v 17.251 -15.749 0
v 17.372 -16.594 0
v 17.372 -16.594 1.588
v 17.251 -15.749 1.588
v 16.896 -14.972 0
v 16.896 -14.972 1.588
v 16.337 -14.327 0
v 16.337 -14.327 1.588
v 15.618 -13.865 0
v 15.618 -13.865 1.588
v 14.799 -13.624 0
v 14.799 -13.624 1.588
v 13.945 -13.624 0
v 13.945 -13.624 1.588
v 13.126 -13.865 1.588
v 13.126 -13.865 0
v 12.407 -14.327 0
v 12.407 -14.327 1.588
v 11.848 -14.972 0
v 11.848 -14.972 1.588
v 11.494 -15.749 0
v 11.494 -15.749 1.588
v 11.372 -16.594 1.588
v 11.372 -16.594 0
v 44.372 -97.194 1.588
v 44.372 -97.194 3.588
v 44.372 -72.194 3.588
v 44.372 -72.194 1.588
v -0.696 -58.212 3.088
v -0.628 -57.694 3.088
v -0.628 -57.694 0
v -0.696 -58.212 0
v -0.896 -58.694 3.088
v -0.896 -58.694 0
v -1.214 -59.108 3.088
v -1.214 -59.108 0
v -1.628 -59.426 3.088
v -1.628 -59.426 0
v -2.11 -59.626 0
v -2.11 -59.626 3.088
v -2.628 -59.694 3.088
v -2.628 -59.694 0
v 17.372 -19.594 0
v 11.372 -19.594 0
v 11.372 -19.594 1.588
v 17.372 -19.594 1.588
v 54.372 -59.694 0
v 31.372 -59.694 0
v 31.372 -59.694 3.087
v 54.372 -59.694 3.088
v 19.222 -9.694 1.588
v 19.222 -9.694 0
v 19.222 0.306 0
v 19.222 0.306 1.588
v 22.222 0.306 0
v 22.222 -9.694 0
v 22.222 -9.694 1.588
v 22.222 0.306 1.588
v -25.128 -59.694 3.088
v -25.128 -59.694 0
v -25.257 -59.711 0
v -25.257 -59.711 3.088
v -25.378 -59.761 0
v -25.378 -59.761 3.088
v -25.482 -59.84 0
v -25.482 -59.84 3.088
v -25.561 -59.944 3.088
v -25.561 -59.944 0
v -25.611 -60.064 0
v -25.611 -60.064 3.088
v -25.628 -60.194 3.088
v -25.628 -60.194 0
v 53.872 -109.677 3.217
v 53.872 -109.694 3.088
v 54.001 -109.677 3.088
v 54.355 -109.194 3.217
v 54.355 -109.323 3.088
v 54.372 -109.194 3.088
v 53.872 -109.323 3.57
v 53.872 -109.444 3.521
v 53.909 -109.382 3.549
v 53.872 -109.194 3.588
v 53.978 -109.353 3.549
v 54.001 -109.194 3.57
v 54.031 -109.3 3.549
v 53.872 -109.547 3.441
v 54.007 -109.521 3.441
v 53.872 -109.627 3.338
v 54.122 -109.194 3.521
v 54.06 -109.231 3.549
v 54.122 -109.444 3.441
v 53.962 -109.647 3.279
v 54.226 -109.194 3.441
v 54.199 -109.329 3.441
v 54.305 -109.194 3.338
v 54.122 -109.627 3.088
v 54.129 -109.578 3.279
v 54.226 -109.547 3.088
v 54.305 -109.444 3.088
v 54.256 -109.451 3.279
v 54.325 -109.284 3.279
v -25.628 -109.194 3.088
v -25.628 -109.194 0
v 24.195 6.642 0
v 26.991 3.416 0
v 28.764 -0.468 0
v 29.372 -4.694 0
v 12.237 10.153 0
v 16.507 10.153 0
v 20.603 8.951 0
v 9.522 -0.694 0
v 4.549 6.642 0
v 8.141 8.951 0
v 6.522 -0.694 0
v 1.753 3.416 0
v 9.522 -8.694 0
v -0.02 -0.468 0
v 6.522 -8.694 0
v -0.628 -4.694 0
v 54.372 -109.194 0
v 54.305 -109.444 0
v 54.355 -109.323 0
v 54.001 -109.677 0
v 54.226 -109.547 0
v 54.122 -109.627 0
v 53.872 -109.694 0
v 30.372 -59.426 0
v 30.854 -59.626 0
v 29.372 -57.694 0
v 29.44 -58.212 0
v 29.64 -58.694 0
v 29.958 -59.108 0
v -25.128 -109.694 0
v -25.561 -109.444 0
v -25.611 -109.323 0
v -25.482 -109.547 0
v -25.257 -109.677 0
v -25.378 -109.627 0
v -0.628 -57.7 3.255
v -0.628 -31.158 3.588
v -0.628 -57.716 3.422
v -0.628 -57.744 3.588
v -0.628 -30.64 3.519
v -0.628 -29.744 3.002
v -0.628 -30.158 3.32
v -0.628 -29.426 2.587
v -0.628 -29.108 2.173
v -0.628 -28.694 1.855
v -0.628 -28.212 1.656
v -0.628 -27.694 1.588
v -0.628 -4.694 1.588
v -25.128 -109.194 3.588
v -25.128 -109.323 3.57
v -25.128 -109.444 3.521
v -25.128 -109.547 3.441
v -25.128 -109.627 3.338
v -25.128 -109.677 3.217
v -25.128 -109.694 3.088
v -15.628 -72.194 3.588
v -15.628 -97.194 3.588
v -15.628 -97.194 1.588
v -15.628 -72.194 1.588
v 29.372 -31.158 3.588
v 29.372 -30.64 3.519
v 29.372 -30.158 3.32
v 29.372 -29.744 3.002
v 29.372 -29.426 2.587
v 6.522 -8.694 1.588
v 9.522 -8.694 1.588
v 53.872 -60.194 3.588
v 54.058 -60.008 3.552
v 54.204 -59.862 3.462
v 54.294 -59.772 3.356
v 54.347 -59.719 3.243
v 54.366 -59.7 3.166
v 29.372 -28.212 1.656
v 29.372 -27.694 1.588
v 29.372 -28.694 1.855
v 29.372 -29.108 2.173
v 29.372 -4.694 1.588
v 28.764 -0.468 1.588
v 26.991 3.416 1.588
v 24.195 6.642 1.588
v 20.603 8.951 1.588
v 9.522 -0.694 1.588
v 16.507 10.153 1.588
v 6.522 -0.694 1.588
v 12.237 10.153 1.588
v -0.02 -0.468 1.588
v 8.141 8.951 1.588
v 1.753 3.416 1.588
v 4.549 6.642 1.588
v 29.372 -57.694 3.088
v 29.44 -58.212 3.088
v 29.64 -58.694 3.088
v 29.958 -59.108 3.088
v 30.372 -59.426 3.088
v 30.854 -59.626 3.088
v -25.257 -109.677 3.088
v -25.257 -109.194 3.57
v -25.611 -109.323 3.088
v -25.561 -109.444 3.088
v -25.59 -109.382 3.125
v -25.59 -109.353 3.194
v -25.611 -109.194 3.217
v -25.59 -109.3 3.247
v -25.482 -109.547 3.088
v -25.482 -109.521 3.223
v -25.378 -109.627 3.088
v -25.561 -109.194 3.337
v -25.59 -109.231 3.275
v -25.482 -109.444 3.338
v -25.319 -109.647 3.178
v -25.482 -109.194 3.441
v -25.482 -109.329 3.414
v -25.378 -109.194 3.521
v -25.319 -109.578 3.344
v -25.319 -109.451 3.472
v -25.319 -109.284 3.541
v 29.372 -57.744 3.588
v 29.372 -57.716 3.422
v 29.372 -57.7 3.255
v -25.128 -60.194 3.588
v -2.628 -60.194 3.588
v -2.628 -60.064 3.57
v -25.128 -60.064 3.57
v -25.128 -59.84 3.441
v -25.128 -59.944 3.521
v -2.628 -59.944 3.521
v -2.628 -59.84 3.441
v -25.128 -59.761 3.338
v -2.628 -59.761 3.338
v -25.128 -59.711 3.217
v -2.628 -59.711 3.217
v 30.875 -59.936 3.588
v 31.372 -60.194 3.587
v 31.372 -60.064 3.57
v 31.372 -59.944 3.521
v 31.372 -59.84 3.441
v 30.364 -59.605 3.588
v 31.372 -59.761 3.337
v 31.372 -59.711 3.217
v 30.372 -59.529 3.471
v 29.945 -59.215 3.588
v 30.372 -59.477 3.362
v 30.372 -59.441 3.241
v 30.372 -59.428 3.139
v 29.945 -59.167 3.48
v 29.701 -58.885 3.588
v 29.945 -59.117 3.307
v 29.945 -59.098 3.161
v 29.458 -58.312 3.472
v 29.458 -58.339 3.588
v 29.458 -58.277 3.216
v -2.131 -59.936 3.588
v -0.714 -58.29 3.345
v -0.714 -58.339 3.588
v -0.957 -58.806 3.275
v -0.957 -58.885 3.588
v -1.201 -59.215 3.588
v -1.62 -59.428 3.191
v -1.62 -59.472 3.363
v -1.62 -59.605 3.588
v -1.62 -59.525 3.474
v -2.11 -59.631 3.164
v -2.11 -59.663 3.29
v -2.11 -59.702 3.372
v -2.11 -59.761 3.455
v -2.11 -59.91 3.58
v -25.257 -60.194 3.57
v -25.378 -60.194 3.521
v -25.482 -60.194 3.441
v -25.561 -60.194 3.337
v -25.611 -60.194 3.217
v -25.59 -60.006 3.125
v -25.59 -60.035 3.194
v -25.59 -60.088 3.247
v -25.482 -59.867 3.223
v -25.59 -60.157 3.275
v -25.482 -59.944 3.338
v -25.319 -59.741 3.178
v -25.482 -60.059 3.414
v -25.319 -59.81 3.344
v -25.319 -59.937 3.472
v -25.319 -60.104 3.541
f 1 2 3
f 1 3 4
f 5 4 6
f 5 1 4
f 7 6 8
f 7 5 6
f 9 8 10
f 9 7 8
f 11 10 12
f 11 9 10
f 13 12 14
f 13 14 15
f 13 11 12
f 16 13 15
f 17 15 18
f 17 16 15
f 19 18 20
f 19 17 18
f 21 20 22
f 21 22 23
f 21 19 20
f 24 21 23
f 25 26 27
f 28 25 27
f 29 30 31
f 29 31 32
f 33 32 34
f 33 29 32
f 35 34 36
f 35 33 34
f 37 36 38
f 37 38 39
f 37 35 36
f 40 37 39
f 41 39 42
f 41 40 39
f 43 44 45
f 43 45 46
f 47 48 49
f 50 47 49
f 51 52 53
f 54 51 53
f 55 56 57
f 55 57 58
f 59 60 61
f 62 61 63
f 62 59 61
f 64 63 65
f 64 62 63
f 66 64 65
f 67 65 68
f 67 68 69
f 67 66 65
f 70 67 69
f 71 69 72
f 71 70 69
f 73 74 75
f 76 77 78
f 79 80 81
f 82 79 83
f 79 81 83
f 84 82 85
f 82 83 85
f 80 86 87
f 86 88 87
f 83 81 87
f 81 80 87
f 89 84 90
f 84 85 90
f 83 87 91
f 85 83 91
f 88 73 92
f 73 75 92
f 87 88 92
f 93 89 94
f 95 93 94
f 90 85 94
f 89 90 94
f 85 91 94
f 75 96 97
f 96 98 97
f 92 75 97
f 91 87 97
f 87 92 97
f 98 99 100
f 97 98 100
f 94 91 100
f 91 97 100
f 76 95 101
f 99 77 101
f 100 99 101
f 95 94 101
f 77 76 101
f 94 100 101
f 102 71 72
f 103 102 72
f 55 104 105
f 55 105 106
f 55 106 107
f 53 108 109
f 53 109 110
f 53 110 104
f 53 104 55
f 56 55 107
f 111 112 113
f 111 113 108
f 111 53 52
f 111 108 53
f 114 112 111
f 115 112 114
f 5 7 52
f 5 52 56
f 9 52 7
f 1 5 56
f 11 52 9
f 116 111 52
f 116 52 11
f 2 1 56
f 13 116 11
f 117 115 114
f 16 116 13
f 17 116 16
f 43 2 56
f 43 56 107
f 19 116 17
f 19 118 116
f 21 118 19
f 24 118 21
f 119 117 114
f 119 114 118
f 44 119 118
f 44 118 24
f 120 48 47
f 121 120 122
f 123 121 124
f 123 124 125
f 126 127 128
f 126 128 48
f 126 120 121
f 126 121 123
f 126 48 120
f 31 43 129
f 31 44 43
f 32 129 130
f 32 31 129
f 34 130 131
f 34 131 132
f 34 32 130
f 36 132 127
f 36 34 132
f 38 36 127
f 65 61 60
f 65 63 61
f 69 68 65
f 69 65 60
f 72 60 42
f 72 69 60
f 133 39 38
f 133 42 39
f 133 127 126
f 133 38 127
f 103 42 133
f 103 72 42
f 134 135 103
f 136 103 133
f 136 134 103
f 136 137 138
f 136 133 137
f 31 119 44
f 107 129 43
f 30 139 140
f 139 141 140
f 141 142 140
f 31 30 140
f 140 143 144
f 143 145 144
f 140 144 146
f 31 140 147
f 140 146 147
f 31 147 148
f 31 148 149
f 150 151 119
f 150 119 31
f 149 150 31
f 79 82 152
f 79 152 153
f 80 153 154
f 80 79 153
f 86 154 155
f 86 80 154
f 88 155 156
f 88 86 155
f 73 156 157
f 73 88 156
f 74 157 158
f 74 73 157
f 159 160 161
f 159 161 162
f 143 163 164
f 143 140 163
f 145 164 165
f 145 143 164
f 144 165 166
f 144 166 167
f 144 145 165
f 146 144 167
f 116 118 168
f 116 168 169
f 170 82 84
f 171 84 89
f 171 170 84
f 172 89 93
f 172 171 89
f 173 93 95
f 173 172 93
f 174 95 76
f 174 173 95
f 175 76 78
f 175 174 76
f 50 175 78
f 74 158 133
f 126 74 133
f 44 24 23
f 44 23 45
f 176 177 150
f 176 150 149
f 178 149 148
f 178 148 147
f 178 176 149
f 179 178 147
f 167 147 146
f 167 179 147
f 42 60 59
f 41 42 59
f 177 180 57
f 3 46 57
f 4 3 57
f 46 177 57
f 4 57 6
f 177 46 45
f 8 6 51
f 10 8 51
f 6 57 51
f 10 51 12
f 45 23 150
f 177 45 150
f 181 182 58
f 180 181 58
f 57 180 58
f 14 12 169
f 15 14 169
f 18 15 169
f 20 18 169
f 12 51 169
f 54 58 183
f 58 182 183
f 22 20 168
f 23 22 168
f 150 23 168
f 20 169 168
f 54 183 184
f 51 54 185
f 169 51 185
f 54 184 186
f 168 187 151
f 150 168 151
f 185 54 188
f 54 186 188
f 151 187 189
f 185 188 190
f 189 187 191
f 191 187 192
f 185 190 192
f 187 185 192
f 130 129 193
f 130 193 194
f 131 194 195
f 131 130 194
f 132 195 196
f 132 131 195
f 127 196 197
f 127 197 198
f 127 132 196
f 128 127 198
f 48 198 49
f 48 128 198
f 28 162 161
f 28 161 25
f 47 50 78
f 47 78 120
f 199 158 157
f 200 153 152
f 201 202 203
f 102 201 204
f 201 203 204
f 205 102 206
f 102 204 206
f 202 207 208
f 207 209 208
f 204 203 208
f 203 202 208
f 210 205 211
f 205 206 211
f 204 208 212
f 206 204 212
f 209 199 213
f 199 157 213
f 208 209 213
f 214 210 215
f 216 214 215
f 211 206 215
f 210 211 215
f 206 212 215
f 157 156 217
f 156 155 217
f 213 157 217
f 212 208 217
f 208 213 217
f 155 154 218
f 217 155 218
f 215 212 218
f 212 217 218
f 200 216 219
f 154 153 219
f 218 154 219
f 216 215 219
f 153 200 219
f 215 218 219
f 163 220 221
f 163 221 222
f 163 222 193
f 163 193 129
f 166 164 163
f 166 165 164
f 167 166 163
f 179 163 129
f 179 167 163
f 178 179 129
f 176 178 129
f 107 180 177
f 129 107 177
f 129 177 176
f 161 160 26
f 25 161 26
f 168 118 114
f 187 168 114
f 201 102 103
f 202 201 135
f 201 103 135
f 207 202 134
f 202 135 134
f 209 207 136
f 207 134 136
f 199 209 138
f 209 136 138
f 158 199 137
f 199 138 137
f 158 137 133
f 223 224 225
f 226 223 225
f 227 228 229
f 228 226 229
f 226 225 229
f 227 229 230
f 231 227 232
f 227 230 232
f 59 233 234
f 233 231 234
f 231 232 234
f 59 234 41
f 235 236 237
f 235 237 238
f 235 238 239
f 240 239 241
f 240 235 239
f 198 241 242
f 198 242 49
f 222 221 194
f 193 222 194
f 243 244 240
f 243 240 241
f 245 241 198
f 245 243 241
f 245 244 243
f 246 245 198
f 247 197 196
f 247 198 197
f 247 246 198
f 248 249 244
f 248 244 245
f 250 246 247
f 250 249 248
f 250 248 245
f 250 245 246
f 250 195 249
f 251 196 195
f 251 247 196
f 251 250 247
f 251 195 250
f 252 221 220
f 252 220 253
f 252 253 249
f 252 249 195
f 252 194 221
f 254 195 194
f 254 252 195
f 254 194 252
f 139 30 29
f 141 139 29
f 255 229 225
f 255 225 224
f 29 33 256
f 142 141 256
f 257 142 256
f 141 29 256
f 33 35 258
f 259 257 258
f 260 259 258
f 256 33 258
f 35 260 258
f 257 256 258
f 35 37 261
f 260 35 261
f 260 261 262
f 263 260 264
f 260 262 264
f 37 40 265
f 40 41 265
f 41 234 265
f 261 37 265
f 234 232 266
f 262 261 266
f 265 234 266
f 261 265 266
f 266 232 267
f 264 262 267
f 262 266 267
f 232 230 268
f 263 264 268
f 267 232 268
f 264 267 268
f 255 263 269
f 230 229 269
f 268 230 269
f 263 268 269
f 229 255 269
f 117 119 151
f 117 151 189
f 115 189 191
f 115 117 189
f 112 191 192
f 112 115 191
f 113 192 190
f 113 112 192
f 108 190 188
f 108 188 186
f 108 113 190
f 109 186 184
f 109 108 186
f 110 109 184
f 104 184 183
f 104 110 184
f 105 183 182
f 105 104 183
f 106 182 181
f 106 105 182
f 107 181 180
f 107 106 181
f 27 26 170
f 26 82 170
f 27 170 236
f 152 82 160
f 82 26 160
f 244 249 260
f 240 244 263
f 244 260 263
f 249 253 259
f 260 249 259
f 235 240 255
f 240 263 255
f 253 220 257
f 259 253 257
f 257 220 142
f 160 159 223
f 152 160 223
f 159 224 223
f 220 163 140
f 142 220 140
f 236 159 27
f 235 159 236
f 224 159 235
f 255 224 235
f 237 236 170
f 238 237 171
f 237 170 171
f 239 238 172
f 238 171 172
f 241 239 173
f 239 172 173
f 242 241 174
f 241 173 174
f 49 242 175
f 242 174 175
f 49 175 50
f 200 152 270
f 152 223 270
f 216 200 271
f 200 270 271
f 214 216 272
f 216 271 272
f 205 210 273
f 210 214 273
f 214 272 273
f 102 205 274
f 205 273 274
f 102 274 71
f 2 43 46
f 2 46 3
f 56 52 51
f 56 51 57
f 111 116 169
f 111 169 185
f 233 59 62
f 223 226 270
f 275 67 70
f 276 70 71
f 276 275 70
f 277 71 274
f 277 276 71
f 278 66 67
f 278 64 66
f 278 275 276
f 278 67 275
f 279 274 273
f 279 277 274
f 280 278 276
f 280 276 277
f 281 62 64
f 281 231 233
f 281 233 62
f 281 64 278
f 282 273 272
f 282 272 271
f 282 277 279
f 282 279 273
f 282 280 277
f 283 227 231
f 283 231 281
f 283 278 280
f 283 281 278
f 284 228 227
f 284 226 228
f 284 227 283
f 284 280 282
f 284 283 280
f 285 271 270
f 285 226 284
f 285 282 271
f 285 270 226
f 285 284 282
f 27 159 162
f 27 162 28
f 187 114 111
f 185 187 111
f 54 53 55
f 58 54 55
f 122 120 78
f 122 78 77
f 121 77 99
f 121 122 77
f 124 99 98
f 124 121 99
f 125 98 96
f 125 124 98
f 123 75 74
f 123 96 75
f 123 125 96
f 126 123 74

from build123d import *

# Parameters (mm, degrees)
SKETCH1_W                = 3
SKETCH1_H                = 10
SKETCH1_H_2              = 8
BOSS_EXTRUDE1_DEPTH      = 1.5875
BOSS_EXTRUDE2_DEPTH      = 40
BOSS_EXTRUDE2_DEPTH_BACK = 40
SKETCH3_W                = 2
SKETCH3_H                = 50
SKETCH3_W_2              = 1.5875
SKETCH6_W                = 2
SKETCH6_H                = 30
BOSS_EXTRUDE3_DEPTH      = 30
SKETCH4_W                = 60
SKETCH4_H                = 25
CUT_EXTRUDE1_DEPTH       = 2
FILLET3_R                = 0.5
FILLET5_R                = 2
FILLET6_R                = 2


with BuildPart() as part:
    # Sketch1 → Boss-Extrude1 (new body)
    with BuildSketch(Plane.XY):
        with BuildLine():
            Line((29.372040361, -4.693897293), (29.372040361, -59.693897293))
            Line((29.372040361, -59.693897293), (-0.627959639, -59.693897293))
            Line((-0.627959639, -59.693897293), (-0.627959639, -4.693897293))
            ThreePointArc((-0.627959639, -4.693897293), (14.372040361, 10.306102707), (29.372040361, -4.693897293))
        make_face()
        with Locations((20.722040361, -4.693897293)):
            Rectangle(SKETCH1_W, SKETCH1_H, mode=Mode.SUBTRACT)
        with Locations((8.022040361, -4.693897293)):
            Rectangle(SKETCH1_W, SKETCH1_H_2, mode=Mode.SUBTRACT)
        with BuildLine():
            ThreePointArc((17.372040361, -16.593897293), (14.372040361, -13.593897293), (11.372040361, -16.593897293))
            Line((11.372040361, -16.593897293), (11.372040361, -19.593897293))
            Line((11.372040361, -19.593897293), (17.372040361, -19.593897293))
            Line((17.372040361, -19.593897293), (17.372040361, -16.593897293))
        make_face(mode=Mode.SUBTRACT)
    extrude(amount=BOSS_EXTRUDE1_DEPTH)

    # Sketch3 → Boss-Extrude2 (add, two sides: drawn at the far end of the back side and taken through both)
    with BuildSketch(Plane(origin=(14.372040361, 0, 0), x_dir=(0, 0, -1), z_dir=(1, 0, 0)).offset(-BOSS_EXTRUDE2_DEPTH_BACK)):
        with Locations((-2.5875, -84.693897293)):
            Rectangle(SKETCH3_W, SKETCH3_H)
        with Locations((-0.79375, -84.693897293)):
            Rectangle(SKETCH3_W_2, SKETCH3_H)
    extrude(amount=BOSS_EXTRUDE2_DEPTH + BOSS_EXTRUDE2_DEPTH_BACK)

    # Sketch6 → Boss-Extrude3 (add)
    with BuildSketch(Plane(origin=(29.372040361, 0, 0), x_dir=(0, 0, -1), z_dir=(1, 0, 0))):
        with Locations((-2.5875, -44.693897293)):
            Rectangle(SKETCH6_W, SKETCH6_H)
    extrude(amount=-BOSS_EXTRUDE3_DEPTH)

    # Sketch4 → Cut-Extrude1 (cut)
    with BuildSketch(Plane.XY.offset(3.5875)):
        with Locations((14.372040361, -84.693897293)):
            Rectangle(SKETCH4_W, SKETCH4_H)
    extrude(amount=-CUT_EXTRUDE1_DEPTH, mode=Mode.SUBTRACT)

    # Fillet3
    fillet3_edges = [part.edges().sort_by_distance(p)[0] for p in [
        (-13.127959639, -59.693897293, 3.5875),
        (54.372040361, -109.693897293, 1.79375),
        (14.372040361, -109.693897293, 3.5875),
        (54.372040361, -84.693897293, 3.5875),
        (-25.627959639, -59.693897293, 1.79375),
        (-25.627959639, -109.693897293, 1.79375),
        (-25.627959639, -84.693897293, 3.5875),
        (41.872040361, -59.693897293, 3.5875),
    ]]
    fillet(fillet3_edges, radius=FILLET3_R)

    # Fillet5
    # the kernel refuses this fillet: 2 mm, written as the material it adds along each edge
    with BuildSketch(Plane(origin=(-0.627959639, -60.193897293, 3.0875), x_dir=(0, 1, 0), z_dir=(0, 0, -1))) as fillet5_piece_1_section:
        with BuildLine():
            CenterArc((0.5 + FILLET5_R, -FILLET5_R), FILLET5_R, 90, 90)
            Line((0.5 + FILLET5_R, 0), (0.5, 0))
            Line((0.5, 0), (0.5, -FILLET5_R))
        make_face()
    fillet5_piece_1 = revolve(axis=Axis((-0.627959639, -60.193897293, 3.0875), (1, 0, 0)), revolution_arc=359.64, mode=Mode.PRIVATE)
    fillet5_piece_1 = split(fillet5_piece_1, bisect_by=Plane(origin=(-1.414331511, -59.810829733, 3.5875), z_dir=(0, 0, -1)), keep=Keep.TOP, mode=Mode.PRIVATE)
    add(fillet5_piece_1)
    with BuildSketch(Plane(origin=(29.372040361, -60.193897293, 3.0875), x_dir=(0, 0.9999802608561372, -0.006283143965558423), z_dir=(0, 0.006283143965558423, 0.9999802608561372))) as fillet5_piece_2_section:
        with BuildLine():
            CenterArc((-0.5 - FILLET5_R, -FILLET5_R), FILLET5_R, 0, 90)
            Line((-0.5, -FILLET5_R), (-0.5, 0))
            Line((-0.5, 0), (-0.5 - FILLET5_R, 0))
        make_face()
    fillet5_piece_2 = revolve(axis=Axis((29.372040361, -60.193897293, 3.0875), (-1, 0, 0)), revolution_arc=359.64, mode=Mode.PRIVATE)
    fillet5_piece_2 = split(fillet5_piece_2, bisect_by=Plane(origin=(30.158412419, -59.810829718, 3.5875), z_dir=(0, 0, -1)), keep=Keep.TOP, mode=Mode.PRIVATE)
    add(fillet5_piece_2)
    with BuildSketch(Plane(origin=(29.372040361, -29.693897293, 1.5875), x_dir=(0, 0, 1), z_dir=(-1, 0, 0))) as fillet5_piece_3:
        with BuildLine():
            CenterArc((FILLET5_R, FILLET5_R), FILLET5_R, 180, 90)
            Line((0, FILLET5_R), (0, 0))
            Line((0, 0), (FILLET5_R, 0))
        make_face()
    extrude(amount=30)
    with BuildSketch(Plane(origin=(-0.627959639, -59.693897293, 3.0875), x_dir=(-1, 0, 0), z_dir=(0, 0, -1))) as fillet5_piece_4:
        with BuildLine():
            CenterArc((FILLET5_R, FILLET5_R), FILLET5_R, 180, 90)
            Line((0, FILLET5_R), (0, 0))
            Line((0, 0), (FILLET5_R, 0))
        make_face()
    extrude(amount=3.0875)
    with BuildSketch(Plane(origin=(29.372040361, -59.693897293, 0), x_dir=(0, 1, 0), z_dir=(0, 0, 1))) as fillet5_piece_5:
        with BuildLine():
            CenterArc((FILLET5_R, -FILLET5_R), FILLET5_R, 90, 90)
            Line((0, -FILLET5_R), (0, 0))
            Line((0, 0), (FILLET5_R, 0))
        make_face()
    extrude(amount=3.0875)

    # Fillet6
    fillet6_edges = [part.edges().sort_by_distance(p)[0] for p in [
        (14.372040361, -29.693897293, 3.5875),
    ]]
    fillet(fillet6_edges, radius=FILLET6_R)


solid = part.part
